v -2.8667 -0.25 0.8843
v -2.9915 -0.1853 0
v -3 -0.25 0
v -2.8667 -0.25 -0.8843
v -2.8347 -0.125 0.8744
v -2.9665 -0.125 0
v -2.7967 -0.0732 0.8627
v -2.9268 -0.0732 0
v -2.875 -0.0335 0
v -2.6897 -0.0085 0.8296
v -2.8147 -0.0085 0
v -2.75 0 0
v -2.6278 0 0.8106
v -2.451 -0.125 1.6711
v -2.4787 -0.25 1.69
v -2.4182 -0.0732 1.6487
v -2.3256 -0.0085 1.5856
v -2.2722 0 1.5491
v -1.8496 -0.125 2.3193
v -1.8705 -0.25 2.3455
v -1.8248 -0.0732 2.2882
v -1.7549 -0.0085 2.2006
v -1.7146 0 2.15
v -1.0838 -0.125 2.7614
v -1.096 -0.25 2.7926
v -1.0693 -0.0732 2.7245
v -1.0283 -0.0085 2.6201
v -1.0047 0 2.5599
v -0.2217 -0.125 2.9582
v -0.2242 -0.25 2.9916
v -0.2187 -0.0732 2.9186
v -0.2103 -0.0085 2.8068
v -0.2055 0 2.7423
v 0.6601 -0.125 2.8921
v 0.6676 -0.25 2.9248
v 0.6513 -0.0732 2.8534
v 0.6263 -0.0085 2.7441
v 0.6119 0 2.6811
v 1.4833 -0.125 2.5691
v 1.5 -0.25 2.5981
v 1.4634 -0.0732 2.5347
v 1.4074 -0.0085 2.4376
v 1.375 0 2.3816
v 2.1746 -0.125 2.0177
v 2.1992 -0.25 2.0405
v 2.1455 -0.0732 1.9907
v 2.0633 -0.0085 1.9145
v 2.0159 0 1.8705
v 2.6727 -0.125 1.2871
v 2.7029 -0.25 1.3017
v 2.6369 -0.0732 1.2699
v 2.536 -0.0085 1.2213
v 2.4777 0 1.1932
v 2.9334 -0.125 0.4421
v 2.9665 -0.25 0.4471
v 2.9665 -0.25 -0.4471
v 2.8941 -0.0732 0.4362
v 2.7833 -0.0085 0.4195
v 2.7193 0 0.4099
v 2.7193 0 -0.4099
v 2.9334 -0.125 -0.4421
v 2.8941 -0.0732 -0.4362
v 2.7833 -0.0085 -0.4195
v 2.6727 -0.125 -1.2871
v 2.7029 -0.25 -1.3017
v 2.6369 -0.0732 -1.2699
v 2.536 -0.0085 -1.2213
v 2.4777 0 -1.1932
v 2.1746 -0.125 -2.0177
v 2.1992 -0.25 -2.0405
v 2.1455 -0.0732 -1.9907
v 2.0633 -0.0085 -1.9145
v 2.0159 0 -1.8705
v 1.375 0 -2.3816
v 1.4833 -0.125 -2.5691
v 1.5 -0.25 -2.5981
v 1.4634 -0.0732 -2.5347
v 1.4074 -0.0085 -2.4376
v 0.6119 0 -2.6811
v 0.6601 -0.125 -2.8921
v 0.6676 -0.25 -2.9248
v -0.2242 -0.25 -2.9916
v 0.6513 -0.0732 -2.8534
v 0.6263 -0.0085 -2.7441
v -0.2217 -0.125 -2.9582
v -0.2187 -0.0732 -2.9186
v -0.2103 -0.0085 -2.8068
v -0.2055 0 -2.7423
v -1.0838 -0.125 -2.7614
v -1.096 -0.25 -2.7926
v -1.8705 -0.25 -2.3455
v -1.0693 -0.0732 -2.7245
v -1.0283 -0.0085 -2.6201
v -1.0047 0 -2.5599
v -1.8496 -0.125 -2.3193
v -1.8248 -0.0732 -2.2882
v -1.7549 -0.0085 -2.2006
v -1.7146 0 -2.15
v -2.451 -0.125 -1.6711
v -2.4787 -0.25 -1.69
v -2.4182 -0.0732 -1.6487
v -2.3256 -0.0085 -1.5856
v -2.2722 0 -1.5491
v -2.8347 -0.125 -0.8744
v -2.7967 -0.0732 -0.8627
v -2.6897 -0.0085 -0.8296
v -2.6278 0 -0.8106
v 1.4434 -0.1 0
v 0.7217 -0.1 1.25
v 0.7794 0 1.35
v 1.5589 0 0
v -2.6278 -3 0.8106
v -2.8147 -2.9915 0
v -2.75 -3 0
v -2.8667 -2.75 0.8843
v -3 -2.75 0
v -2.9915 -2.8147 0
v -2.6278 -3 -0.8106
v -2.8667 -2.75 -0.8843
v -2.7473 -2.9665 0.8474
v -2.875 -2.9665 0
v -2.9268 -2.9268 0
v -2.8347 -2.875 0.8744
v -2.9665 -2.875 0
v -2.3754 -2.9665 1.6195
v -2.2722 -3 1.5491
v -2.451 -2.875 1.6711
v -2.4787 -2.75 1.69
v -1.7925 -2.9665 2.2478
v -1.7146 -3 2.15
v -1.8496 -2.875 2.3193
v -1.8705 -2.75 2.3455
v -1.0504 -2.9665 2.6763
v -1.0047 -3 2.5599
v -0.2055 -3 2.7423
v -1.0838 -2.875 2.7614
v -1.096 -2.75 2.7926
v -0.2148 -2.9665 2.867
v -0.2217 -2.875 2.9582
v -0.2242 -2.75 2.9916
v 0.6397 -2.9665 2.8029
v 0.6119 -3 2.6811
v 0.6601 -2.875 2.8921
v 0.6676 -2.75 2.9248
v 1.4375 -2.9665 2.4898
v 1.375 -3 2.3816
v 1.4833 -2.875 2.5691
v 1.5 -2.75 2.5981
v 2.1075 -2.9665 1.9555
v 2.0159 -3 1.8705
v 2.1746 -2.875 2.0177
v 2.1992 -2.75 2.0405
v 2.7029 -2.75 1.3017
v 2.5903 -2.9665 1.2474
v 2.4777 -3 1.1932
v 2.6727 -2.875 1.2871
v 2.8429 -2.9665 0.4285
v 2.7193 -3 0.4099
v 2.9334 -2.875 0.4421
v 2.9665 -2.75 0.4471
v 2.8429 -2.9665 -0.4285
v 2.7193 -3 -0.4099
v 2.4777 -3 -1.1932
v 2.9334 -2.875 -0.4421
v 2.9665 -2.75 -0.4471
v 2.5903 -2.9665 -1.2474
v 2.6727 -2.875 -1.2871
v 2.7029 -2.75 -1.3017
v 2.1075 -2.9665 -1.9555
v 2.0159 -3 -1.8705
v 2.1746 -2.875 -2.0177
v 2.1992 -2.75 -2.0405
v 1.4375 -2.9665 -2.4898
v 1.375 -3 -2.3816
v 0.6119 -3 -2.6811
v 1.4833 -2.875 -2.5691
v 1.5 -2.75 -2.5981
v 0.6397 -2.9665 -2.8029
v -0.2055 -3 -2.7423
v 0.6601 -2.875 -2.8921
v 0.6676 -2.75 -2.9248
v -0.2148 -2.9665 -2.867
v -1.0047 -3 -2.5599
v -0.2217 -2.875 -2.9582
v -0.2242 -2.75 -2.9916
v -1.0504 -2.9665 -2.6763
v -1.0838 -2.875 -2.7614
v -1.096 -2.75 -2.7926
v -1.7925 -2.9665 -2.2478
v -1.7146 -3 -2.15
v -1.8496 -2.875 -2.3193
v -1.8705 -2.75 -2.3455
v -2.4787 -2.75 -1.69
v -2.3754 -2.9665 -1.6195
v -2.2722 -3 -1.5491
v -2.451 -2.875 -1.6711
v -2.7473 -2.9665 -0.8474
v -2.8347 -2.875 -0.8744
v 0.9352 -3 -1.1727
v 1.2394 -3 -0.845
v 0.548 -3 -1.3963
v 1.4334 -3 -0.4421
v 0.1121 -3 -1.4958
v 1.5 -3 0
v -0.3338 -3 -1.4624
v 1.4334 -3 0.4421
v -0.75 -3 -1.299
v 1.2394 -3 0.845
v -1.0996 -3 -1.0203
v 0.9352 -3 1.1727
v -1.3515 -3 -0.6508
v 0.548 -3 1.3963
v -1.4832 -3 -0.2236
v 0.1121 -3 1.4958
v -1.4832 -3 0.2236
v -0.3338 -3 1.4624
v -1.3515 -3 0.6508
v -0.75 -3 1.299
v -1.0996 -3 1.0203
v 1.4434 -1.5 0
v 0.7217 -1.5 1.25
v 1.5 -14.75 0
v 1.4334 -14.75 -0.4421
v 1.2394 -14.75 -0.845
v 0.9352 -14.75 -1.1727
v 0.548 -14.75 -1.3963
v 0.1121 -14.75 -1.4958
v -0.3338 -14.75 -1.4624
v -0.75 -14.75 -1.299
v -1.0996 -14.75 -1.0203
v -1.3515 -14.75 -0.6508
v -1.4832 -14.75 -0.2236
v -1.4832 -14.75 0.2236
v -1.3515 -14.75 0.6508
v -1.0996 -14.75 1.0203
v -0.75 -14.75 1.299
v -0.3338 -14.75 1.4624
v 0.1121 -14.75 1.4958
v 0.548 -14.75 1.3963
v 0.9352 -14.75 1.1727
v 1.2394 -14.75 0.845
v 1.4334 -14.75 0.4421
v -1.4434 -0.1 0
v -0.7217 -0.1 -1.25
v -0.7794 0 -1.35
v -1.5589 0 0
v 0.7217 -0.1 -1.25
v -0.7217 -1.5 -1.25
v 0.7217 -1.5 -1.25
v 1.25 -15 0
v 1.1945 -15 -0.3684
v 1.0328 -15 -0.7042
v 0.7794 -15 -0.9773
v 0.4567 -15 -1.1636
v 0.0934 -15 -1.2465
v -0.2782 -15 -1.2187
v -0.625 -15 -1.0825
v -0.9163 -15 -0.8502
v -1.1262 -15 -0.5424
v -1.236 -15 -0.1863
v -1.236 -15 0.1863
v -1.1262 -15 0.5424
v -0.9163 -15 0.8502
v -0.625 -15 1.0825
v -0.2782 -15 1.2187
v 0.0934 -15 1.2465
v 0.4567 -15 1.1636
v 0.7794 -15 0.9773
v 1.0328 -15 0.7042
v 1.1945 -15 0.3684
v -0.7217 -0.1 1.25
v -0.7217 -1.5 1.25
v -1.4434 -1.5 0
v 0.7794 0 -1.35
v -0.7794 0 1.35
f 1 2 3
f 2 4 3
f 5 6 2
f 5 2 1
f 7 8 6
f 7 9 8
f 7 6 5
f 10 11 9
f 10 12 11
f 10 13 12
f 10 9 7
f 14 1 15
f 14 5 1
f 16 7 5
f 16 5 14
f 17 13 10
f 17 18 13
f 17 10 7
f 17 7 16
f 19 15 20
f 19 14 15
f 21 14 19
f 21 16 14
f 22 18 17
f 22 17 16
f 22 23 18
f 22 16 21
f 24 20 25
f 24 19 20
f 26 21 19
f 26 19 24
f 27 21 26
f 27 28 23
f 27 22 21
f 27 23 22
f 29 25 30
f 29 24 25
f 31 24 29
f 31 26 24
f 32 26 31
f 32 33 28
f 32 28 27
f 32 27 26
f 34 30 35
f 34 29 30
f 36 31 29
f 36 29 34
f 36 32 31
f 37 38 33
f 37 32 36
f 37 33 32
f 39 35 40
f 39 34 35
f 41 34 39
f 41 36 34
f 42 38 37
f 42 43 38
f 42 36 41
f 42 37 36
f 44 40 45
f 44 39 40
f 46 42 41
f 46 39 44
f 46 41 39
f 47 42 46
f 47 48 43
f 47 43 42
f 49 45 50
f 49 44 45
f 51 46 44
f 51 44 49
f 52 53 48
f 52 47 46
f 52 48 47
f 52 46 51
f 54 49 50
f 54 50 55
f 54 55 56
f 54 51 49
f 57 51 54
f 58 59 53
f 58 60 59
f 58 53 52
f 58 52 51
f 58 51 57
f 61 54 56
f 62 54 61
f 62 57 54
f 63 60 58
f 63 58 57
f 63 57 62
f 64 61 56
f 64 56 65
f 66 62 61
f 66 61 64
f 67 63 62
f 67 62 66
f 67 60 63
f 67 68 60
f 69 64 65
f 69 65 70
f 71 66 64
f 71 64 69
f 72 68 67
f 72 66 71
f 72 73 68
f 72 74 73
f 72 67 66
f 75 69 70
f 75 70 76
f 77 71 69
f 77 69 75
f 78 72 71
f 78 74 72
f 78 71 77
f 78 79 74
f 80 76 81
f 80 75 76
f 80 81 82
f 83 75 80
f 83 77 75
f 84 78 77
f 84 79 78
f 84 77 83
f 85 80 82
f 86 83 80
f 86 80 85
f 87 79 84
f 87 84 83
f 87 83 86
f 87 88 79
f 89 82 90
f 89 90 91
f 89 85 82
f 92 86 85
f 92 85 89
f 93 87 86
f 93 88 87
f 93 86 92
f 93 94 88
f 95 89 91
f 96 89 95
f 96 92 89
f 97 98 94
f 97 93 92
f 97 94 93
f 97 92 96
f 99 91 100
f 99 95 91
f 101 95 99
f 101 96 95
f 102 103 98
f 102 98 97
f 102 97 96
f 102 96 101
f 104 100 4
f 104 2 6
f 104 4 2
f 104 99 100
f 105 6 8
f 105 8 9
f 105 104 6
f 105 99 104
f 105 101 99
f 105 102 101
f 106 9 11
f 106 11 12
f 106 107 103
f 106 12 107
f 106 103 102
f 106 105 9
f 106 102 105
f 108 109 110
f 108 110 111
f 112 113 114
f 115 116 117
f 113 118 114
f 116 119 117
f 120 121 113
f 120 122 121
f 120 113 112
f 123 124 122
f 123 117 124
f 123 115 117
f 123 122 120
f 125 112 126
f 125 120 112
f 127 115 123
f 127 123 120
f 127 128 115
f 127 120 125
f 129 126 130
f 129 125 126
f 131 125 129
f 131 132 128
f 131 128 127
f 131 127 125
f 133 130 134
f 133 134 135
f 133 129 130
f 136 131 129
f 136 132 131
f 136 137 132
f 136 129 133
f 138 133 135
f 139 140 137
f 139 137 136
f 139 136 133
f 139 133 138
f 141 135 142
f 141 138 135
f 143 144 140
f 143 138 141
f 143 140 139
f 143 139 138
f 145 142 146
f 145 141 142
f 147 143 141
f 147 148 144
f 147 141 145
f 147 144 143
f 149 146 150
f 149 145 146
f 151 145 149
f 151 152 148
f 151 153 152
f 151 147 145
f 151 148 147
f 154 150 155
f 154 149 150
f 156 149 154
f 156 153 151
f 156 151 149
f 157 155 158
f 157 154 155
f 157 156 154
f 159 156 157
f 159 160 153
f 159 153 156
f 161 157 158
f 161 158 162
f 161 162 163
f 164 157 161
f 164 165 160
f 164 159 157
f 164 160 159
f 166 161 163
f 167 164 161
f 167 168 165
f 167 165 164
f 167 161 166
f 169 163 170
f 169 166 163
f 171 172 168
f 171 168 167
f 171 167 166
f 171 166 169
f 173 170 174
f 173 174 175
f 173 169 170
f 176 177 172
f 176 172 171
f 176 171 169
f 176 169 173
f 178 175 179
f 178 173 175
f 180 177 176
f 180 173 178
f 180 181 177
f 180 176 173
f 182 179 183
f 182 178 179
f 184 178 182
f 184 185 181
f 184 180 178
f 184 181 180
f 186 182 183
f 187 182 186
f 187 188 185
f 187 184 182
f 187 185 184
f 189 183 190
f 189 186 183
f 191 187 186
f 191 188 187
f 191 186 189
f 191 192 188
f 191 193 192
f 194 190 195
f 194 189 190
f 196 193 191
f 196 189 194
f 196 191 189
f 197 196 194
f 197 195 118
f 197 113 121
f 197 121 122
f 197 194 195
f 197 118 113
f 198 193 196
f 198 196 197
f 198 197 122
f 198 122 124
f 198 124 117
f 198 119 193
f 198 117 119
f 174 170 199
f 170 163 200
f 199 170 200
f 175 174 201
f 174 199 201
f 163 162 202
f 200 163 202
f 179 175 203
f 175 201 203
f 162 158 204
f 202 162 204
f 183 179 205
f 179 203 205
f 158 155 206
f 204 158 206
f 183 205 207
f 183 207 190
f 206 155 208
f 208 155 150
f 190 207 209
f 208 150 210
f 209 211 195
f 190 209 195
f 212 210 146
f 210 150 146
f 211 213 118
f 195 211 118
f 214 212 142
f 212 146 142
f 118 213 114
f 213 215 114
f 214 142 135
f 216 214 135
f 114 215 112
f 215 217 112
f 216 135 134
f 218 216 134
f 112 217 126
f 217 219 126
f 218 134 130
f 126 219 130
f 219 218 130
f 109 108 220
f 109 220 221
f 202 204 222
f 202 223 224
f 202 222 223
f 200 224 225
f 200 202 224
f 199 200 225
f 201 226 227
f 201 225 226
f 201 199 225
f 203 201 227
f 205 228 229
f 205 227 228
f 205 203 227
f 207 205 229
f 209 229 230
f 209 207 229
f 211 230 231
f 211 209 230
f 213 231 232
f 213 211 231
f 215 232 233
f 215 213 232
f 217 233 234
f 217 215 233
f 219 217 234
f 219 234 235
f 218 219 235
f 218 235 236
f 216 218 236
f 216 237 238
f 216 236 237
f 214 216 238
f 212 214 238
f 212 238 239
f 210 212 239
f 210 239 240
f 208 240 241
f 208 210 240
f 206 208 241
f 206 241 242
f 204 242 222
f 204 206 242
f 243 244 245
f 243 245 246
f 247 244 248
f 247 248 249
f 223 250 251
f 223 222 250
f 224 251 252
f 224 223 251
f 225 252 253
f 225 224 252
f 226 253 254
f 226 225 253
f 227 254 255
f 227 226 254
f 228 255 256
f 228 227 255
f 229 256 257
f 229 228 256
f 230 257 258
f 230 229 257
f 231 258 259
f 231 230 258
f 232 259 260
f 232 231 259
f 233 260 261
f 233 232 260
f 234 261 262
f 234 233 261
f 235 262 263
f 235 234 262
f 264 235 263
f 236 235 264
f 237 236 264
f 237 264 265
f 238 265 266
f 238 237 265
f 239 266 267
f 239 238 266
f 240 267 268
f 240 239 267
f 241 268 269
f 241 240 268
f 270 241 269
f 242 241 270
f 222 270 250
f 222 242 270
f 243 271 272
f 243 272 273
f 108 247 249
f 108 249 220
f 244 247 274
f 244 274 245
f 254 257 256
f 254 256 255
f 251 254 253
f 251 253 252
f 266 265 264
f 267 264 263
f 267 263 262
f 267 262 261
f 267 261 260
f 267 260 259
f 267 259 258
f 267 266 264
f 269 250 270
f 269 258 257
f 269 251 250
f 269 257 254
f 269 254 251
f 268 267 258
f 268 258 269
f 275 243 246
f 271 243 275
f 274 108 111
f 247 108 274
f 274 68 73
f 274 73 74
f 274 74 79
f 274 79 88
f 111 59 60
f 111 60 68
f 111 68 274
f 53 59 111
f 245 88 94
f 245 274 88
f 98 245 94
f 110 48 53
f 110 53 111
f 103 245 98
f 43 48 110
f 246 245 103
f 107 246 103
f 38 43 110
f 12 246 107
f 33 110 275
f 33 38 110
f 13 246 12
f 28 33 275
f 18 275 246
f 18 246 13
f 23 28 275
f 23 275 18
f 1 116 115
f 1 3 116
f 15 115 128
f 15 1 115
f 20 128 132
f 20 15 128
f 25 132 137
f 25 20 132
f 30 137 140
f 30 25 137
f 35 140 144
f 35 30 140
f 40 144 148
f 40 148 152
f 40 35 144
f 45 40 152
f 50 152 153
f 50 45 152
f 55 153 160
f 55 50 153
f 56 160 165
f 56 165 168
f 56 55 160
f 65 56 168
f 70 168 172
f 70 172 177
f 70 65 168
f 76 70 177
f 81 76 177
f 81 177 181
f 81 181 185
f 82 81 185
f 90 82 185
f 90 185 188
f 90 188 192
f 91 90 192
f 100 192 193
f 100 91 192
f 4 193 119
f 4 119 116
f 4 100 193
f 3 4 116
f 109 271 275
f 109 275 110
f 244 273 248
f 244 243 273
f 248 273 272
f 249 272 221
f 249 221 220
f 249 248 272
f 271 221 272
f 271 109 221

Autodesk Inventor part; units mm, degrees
ref_plane "YZ Plane" through (0, 0, 0) normal (1, 0, 0) x (0, 1, 0)
ref_plane "XZ Plane" through (0, 0, 0) normal (0, 1, 0) x (-1, 0, 0)
ref_plane "XY Plane" through (0, 0, 0) normal (0, 0, 1) x (1, 0, 0)
sketch "Sketch1" plane through (0, 0, 0) normal (0, 1, 0) x (-1, 0, 0)
  circle A0 centre (0, 0) radius 3
  dimension "d0" = 6
extrude "Extrusion1" add sketch "Sketch1" against normal blind 3
sketch "Sketch2" plane through (0, -3, 0) normal (0, -1, 0) x (1, 0, 0)
  circle A0 centre (0, 0) radius 1.5
  dimension "d3" = 3
extrude "Extrusion2" add sketch "Sketch2" along normal blind 12
sketch "Sketch3" plane through (0, 0, 0) normal (0, 1, 0) x (1, 0, 0)
  circle A0 centre (0, 0) radius 1.5 construction
  line L0 (1.4434, 0) -> (0.7217, -1.25)
  line L1 (0.7217, -1.25) -> (-0.7217, -1.25)
  line L2 (-0.7217, -1.25) -> (-1.4434, 0)
  line L3 (-1.4434, 0) -> (-0.7217, 1.25)
  line L4 (-0.7217, 1.25) -> (0.7217, 1.25)
  line L5 (0.7217, 1.25) -> (1.4434, 0)
  dimension "d8" = 2.5
extrude "Extrusion3" cut sketch "Sketch3" against normal blind 1.5
chamfer "Chamfer1" distance 0.25 angle 45 1 edges at (-1.5, -15, 0)
fillet "Fillet1" radius 0.25 2 edges at (3, 0, 0) (3, -3, 0)
chamfer "Chamfer2" distance 0.1 angle 45 6 edges at (0, 0, -1.25) (1.0825, 0, -0.625) (1.0825, 0, 0.625) (0, 0, 1.25) (-1.0825, 0, 0.625) (-1.0825, 0, -0.625)
thread "Thread2" size "M3x0.5" class "6g" standard "ANSI Metric M Profile" full length
properties part number "M3-12" material "Steel, Carbon"
